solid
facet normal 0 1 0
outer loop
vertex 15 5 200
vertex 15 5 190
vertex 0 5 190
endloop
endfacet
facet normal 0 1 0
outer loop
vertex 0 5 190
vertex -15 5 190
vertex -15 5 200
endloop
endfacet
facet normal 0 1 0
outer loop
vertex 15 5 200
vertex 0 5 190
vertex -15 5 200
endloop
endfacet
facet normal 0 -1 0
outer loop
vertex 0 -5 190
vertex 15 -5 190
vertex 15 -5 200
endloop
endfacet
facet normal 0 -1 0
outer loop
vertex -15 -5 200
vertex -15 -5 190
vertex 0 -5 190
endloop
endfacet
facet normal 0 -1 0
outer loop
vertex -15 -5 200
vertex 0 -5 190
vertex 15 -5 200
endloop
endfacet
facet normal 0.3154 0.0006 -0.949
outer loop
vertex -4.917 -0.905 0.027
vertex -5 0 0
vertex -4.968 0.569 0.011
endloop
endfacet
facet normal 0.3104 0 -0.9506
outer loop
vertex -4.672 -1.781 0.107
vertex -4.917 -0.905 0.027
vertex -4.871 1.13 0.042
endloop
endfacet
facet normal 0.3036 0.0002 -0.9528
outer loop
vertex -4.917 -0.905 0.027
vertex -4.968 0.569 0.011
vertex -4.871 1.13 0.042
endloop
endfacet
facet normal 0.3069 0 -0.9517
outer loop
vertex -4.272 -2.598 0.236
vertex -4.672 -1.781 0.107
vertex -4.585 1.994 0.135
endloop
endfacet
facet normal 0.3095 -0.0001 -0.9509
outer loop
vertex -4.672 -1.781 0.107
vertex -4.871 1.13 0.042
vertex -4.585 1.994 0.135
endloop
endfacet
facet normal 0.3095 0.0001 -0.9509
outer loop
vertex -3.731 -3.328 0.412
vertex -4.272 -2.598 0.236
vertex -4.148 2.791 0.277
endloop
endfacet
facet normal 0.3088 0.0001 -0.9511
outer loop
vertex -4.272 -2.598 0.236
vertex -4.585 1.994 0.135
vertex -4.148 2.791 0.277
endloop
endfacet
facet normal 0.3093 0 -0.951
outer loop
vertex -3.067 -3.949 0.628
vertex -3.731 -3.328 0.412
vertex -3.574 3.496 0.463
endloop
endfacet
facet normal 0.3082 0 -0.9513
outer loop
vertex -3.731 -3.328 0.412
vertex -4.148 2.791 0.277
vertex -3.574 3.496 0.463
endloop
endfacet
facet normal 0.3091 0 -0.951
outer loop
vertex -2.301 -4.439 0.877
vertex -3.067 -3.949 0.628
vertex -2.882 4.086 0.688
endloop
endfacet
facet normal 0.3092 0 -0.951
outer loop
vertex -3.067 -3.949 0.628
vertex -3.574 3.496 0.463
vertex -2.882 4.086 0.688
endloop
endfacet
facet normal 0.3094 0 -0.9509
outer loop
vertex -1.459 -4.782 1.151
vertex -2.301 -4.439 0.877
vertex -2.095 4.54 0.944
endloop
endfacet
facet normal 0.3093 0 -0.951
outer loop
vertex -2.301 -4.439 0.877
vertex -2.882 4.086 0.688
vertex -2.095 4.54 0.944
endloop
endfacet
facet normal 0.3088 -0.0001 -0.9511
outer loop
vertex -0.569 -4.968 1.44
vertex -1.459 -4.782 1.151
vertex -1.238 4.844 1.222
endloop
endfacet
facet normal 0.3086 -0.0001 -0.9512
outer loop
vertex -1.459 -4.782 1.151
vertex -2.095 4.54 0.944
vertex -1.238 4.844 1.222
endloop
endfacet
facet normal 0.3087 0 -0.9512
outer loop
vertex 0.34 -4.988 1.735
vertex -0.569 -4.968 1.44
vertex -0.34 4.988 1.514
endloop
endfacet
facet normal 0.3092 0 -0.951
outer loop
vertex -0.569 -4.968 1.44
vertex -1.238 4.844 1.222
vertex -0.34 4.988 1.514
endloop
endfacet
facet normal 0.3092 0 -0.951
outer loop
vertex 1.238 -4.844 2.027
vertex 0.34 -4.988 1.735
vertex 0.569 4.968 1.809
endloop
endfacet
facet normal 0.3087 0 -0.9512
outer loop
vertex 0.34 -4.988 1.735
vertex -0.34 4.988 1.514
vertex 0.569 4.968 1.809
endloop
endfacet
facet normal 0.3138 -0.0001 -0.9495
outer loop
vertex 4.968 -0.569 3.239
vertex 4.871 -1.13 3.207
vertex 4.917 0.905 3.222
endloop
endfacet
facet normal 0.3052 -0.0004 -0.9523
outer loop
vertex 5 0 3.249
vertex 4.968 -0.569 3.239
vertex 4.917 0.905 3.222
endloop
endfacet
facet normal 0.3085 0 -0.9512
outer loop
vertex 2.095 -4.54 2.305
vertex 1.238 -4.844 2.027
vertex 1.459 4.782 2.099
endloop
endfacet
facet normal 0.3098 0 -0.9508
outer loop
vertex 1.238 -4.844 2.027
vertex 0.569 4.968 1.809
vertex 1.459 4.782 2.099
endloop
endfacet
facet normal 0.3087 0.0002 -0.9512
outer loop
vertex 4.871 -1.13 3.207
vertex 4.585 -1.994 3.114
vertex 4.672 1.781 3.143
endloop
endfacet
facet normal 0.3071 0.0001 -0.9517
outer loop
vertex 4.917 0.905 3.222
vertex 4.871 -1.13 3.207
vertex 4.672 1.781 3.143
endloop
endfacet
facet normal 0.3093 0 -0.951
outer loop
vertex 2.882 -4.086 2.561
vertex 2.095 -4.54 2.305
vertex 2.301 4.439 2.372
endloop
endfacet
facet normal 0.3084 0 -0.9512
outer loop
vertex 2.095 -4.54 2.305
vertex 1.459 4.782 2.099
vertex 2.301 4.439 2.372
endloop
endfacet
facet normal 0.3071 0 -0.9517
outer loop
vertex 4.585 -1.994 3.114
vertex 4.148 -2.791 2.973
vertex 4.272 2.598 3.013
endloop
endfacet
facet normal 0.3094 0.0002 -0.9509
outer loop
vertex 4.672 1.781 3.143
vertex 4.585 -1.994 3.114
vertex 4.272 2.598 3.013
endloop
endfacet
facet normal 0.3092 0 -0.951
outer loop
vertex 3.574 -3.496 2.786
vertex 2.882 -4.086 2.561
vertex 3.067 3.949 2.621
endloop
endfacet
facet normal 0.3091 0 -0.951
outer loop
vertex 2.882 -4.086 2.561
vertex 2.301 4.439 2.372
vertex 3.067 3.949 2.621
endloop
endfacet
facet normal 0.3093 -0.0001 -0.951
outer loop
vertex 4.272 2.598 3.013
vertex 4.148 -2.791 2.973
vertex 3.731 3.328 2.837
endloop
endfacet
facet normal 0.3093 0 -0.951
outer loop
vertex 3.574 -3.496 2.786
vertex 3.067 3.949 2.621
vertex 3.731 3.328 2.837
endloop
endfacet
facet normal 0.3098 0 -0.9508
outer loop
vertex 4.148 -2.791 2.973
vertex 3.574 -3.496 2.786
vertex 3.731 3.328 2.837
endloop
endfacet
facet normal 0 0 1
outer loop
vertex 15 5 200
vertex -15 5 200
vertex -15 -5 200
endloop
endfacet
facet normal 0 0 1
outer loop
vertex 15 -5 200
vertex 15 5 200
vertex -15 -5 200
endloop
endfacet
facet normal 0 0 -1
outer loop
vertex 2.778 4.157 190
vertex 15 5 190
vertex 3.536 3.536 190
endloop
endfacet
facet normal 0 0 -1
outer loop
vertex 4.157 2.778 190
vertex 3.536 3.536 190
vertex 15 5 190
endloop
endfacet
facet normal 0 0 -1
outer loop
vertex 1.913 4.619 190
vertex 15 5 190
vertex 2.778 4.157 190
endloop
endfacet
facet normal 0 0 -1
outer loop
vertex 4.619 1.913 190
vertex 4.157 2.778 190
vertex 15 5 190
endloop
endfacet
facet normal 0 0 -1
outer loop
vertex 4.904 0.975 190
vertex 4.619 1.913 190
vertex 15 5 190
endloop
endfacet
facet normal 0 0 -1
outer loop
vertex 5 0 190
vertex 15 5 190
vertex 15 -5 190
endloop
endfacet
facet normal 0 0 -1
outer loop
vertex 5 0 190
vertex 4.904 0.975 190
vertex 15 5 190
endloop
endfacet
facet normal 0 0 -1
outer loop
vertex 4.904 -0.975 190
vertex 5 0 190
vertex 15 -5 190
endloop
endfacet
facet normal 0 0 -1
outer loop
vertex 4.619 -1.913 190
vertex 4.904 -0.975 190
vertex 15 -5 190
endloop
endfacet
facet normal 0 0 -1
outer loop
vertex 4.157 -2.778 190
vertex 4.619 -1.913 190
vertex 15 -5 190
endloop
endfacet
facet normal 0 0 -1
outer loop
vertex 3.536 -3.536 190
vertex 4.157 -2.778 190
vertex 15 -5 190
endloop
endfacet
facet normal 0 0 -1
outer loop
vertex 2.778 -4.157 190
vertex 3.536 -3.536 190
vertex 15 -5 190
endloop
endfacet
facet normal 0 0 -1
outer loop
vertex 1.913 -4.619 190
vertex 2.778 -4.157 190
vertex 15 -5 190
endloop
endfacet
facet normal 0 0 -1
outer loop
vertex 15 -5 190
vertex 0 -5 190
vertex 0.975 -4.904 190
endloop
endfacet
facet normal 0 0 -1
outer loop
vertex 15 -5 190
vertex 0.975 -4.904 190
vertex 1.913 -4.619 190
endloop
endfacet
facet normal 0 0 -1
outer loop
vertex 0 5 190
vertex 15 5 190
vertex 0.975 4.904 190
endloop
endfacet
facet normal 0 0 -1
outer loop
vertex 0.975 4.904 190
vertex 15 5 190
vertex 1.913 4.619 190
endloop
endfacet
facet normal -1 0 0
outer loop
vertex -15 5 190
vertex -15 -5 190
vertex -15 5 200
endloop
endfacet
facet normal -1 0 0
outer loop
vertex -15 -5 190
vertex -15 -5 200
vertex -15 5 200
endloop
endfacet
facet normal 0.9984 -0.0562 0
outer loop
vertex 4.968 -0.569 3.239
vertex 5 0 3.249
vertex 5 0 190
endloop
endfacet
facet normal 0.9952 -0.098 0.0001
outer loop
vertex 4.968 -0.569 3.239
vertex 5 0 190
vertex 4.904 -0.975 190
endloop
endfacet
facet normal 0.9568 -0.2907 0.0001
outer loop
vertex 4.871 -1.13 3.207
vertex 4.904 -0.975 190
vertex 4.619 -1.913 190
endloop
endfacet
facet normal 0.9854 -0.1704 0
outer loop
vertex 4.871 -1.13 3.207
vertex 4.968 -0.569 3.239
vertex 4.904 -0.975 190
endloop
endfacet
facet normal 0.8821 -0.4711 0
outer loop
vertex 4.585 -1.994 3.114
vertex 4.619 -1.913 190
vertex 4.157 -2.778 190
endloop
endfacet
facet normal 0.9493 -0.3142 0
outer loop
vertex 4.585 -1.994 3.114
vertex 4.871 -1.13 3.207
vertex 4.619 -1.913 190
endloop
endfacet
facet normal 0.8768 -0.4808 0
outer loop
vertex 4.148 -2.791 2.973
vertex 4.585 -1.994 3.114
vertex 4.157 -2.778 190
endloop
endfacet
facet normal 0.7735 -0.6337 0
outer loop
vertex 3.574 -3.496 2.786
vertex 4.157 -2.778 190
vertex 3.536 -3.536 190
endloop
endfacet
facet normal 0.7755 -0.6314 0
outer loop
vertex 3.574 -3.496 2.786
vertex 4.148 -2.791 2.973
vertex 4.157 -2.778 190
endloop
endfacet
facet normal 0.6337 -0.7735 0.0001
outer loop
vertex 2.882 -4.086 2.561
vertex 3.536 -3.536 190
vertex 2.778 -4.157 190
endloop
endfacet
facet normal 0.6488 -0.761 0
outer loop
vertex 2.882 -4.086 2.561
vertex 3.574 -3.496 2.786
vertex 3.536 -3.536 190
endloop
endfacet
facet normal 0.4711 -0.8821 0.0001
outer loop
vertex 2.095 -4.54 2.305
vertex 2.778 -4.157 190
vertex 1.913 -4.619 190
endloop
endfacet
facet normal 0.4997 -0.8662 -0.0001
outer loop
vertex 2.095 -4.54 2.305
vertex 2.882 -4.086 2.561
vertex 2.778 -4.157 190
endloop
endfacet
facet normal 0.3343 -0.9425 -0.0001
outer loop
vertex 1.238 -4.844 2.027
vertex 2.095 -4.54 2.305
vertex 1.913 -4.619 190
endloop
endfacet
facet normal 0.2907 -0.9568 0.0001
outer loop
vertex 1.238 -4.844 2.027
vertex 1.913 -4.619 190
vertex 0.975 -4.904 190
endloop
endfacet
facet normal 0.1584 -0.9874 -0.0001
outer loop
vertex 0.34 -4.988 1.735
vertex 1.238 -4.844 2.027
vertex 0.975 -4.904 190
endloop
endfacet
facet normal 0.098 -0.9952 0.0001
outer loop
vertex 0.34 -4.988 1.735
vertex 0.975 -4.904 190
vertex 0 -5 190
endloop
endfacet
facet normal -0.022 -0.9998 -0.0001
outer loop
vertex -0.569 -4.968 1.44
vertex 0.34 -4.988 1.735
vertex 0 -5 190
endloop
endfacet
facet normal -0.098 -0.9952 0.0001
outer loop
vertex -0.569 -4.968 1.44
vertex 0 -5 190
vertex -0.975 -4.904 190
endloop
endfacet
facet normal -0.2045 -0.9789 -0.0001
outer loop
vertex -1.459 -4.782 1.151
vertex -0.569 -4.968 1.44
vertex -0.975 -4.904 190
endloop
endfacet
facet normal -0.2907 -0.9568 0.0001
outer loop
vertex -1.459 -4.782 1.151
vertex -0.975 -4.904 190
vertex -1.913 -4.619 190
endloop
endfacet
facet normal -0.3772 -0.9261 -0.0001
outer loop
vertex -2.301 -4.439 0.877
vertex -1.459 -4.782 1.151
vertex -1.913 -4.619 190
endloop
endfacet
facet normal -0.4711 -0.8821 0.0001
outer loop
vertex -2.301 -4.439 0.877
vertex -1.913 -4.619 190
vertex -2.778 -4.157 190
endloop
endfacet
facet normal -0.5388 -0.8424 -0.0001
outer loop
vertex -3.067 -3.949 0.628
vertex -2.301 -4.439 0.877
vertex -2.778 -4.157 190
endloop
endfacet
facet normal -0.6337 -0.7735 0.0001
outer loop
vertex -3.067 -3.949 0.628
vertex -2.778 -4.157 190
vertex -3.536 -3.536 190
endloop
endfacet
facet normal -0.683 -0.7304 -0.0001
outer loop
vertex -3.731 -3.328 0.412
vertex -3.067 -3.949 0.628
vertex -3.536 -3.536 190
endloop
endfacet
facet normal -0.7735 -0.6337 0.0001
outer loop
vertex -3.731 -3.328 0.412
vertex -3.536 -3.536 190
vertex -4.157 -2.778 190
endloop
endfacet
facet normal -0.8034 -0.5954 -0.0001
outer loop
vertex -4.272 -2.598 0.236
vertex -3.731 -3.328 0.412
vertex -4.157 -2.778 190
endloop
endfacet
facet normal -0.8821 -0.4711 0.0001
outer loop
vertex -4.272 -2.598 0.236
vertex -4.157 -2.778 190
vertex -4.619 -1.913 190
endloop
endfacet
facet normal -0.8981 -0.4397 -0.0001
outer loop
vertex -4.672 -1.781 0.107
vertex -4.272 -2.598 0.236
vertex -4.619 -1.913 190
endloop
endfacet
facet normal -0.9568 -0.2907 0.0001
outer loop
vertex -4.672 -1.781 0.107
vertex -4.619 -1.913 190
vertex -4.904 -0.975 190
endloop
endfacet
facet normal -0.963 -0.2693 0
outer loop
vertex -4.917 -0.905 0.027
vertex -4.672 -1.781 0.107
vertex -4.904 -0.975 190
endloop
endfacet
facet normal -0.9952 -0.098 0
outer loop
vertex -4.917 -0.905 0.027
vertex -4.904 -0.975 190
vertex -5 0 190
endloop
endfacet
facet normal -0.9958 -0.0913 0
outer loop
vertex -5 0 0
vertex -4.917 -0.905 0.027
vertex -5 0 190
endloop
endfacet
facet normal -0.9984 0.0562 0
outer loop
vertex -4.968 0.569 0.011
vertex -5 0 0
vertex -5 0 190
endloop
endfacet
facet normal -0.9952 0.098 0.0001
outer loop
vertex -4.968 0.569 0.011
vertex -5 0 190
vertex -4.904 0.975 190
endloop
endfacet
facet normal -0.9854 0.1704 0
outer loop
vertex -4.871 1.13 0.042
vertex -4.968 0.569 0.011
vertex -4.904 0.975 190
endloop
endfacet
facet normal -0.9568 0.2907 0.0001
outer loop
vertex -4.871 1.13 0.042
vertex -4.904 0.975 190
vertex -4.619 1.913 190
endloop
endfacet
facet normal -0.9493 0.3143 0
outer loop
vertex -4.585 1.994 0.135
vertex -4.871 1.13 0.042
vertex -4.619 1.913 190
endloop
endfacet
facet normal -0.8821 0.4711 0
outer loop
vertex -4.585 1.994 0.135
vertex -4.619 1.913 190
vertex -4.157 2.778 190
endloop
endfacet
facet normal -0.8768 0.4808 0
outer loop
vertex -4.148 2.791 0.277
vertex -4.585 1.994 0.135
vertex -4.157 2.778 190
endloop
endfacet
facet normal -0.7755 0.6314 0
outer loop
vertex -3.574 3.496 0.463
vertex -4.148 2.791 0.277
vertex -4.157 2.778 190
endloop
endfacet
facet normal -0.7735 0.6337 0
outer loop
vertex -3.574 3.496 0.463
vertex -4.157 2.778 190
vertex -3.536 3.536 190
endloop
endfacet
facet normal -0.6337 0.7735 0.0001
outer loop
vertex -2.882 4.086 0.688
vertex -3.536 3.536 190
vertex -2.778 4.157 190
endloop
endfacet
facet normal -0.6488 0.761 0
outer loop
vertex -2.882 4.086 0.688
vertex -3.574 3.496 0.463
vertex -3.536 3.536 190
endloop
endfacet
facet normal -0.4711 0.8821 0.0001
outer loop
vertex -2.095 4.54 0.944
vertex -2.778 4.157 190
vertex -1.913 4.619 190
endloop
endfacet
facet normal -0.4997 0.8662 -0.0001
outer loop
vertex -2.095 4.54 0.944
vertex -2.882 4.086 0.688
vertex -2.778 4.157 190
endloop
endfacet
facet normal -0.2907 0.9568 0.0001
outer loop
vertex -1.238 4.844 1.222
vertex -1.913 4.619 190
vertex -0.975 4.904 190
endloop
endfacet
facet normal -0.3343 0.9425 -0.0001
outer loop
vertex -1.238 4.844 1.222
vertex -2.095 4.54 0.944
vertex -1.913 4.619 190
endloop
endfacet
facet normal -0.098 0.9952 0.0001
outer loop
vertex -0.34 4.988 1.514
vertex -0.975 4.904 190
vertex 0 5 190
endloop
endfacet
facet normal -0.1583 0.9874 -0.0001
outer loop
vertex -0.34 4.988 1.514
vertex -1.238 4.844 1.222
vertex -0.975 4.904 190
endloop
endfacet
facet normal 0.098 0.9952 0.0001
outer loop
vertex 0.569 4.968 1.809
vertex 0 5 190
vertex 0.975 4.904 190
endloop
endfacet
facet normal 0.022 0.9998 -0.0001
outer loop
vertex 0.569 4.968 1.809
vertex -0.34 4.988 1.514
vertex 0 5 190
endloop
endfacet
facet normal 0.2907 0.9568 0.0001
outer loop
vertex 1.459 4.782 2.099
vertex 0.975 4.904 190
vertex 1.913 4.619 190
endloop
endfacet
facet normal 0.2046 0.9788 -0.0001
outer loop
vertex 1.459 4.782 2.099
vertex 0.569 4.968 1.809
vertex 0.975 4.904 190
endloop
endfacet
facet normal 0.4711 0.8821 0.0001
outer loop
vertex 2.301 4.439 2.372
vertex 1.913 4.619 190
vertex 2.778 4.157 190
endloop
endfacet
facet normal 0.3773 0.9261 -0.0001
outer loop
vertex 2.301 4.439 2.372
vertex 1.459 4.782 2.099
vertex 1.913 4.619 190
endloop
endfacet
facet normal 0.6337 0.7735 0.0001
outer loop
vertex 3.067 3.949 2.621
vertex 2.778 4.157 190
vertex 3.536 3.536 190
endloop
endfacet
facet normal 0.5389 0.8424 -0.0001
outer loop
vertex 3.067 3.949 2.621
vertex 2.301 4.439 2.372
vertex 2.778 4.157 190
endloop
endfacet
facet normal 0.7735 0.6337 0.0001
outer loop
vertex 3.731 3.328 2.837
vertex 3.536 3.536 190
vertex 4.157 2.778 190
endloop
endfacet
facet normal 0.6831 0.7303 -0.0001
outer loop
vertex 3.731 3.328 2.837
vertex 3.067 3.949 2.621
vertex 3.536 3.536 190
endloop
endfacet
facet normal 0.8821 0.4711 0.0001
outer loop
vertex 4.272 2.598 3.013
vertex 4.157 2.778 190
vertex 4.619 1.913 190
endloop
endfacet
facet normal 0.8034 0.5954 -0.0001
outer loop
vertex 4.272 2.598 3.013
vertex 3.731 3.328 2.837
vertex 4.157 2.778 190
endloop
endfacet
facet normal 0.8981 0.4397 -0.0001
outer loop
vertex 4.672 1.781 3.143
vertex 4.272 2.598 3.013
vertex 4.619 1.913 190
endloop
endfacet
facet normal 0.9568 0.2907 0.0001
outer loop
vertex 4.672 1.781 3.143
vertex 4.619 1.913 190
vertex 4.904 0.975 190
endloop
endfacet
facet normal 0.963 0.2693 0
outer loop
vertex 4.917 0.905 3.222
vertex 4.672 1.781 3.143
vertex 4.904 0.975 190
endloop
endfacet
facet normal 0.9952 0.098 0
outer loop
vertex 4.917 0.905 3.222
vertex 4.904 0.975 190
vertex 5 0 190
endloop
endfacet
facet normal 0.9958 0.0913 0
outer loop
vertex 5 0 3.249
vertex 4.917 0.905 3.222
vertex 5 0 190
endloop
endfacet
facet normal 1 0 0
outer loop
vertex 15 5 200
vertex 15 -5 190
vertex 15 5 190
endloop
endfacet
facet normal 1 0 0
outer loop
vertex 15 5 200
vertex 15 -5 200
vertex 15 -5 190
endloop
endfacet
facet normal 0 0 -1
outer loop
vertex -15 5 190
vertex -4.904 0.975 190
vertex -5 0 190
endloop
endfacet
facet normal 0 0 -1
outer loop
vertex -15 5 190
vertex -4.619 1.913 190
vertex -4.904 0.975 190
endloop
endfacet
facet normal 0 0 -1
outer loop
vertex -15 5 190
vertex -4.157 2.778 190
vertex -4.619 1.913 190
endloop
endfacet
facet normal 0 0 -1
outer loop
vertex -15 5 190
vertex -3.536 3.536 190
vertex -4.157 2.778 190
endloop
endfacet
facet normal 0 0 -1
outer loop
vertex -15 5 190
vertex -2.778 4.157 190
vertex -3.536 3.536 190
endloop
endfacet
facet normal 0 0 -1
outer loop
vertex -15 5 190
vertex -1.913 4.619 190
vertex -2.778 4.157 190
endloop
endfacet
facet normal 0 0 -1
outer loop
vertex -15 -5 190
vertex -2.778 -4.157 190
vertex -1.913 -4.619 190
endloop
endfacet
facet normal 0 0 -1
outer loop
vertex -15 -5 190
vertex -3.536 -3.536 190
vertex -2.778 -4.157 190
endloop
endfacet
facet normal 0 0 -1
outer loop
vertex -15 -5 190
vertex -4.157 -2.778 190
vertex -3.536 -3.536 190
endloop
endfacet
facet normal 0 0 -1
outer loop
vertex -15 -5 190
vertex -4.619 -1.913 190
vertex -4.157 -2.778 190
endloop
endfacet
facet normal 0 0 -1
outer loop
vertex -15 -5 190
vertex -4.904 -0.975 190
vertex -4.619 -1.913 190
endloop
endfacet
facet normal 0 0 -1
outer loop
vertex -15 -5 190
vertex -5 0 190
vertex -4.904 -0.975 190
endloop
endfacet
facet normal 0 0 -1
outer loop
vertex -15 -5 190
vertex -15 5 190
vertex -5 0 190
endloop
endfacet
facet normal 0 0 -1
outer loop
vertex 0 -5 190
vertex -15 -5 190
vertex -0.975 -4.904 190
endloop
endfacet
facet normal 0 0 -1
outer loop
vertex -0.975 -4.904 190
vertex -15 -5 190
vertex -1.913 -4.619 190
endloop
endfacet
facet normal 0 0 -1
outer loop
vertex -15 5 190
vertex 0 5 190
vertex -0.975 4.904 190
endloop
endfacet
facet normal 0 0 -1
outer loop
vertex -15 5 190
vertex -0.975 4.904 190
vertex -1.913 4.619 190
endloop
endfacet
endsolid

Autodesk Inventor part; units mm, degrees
ref_plane "YZ Plane" through (0, 0, 0) normal (1, 0, 0) x (0, 1, 0)
ref_plane "XZ Plane" through (0, 0, 0) normal (0, 1, 0) x (-1, 0, 0)
sketch "Sketch1" plane through (0, 0, 0) normal (0, 0, 1) x (1, 0, 0)
  circle A0 centre (0, 0) radius 5
  dimension "d0" = 10
extrude "Extrusion1" add sketch "Sketch1" along normal blind 200
sketch "Sketch2" plane through (0, 0, 0) normal (1, 0, 0) x (0, 1, 0)
  line L0 (-5, 0) -> (-5, 200) projected
  line L1 (5, 0) -> (5, 200) projected
  line L2 (5, 200) -> (-5, 200) projected
  line L3 (-5, 200) -> (5, 200)
  line L4 (5, 200) -> (5, 190)
  line L5 (5, 190) -> (-5, 190)
  line L6 (-5, 190) -> (-5, 200)
  point P0 (0, 0)
  dimension "d3" = 10
extrude "Extrusion2" add sketch "Sketch2" along normal mid plane 30
ref_plane "Work Plane1" through (-15, 0, 200) normal (0, -1, 0) x (1, 0, 0)
sketch "Sketch3" plane through (-15, 0, 200) normal (0, -1, 0) x (1, 0, 0)
  line L0 (0, 0) -> (30, 0) projected
  line L1 (30, -10) -> (30, 0) projected
  line L2 (15, -10) -> (30, -10) projected
  line L3 (0, -10) -> (15, -10) projected
  line L4 (0, 0) -> (0, -10) projected
  line L5 (15, -10) -> (15, -10) projected
  line L6 (15, -10) -> (15, -10) projected
  line L7 (10, -200) -> (20, -200) projected
  line L8 (20, -200) -> (20, -10) projected
  line L9 (10, -200) -> (20, -196.7508)
  line L10 (10, -200) -> (20, -200) projected
  line L11 (20, -196.7508) -> (20, -200)
  line L12 (10, -200) -> (20, -200)
  line L13 (10, -200) -> (10, -10) projected
  point P0 (15, -200)
  dimension "d10" = 18
extrude "Extrusion3" cut sketch "Sketch3" along normal through all both and the other way through all contours L9 L8 L7
properties part number "EE_Arm-Rod-Rev1"
